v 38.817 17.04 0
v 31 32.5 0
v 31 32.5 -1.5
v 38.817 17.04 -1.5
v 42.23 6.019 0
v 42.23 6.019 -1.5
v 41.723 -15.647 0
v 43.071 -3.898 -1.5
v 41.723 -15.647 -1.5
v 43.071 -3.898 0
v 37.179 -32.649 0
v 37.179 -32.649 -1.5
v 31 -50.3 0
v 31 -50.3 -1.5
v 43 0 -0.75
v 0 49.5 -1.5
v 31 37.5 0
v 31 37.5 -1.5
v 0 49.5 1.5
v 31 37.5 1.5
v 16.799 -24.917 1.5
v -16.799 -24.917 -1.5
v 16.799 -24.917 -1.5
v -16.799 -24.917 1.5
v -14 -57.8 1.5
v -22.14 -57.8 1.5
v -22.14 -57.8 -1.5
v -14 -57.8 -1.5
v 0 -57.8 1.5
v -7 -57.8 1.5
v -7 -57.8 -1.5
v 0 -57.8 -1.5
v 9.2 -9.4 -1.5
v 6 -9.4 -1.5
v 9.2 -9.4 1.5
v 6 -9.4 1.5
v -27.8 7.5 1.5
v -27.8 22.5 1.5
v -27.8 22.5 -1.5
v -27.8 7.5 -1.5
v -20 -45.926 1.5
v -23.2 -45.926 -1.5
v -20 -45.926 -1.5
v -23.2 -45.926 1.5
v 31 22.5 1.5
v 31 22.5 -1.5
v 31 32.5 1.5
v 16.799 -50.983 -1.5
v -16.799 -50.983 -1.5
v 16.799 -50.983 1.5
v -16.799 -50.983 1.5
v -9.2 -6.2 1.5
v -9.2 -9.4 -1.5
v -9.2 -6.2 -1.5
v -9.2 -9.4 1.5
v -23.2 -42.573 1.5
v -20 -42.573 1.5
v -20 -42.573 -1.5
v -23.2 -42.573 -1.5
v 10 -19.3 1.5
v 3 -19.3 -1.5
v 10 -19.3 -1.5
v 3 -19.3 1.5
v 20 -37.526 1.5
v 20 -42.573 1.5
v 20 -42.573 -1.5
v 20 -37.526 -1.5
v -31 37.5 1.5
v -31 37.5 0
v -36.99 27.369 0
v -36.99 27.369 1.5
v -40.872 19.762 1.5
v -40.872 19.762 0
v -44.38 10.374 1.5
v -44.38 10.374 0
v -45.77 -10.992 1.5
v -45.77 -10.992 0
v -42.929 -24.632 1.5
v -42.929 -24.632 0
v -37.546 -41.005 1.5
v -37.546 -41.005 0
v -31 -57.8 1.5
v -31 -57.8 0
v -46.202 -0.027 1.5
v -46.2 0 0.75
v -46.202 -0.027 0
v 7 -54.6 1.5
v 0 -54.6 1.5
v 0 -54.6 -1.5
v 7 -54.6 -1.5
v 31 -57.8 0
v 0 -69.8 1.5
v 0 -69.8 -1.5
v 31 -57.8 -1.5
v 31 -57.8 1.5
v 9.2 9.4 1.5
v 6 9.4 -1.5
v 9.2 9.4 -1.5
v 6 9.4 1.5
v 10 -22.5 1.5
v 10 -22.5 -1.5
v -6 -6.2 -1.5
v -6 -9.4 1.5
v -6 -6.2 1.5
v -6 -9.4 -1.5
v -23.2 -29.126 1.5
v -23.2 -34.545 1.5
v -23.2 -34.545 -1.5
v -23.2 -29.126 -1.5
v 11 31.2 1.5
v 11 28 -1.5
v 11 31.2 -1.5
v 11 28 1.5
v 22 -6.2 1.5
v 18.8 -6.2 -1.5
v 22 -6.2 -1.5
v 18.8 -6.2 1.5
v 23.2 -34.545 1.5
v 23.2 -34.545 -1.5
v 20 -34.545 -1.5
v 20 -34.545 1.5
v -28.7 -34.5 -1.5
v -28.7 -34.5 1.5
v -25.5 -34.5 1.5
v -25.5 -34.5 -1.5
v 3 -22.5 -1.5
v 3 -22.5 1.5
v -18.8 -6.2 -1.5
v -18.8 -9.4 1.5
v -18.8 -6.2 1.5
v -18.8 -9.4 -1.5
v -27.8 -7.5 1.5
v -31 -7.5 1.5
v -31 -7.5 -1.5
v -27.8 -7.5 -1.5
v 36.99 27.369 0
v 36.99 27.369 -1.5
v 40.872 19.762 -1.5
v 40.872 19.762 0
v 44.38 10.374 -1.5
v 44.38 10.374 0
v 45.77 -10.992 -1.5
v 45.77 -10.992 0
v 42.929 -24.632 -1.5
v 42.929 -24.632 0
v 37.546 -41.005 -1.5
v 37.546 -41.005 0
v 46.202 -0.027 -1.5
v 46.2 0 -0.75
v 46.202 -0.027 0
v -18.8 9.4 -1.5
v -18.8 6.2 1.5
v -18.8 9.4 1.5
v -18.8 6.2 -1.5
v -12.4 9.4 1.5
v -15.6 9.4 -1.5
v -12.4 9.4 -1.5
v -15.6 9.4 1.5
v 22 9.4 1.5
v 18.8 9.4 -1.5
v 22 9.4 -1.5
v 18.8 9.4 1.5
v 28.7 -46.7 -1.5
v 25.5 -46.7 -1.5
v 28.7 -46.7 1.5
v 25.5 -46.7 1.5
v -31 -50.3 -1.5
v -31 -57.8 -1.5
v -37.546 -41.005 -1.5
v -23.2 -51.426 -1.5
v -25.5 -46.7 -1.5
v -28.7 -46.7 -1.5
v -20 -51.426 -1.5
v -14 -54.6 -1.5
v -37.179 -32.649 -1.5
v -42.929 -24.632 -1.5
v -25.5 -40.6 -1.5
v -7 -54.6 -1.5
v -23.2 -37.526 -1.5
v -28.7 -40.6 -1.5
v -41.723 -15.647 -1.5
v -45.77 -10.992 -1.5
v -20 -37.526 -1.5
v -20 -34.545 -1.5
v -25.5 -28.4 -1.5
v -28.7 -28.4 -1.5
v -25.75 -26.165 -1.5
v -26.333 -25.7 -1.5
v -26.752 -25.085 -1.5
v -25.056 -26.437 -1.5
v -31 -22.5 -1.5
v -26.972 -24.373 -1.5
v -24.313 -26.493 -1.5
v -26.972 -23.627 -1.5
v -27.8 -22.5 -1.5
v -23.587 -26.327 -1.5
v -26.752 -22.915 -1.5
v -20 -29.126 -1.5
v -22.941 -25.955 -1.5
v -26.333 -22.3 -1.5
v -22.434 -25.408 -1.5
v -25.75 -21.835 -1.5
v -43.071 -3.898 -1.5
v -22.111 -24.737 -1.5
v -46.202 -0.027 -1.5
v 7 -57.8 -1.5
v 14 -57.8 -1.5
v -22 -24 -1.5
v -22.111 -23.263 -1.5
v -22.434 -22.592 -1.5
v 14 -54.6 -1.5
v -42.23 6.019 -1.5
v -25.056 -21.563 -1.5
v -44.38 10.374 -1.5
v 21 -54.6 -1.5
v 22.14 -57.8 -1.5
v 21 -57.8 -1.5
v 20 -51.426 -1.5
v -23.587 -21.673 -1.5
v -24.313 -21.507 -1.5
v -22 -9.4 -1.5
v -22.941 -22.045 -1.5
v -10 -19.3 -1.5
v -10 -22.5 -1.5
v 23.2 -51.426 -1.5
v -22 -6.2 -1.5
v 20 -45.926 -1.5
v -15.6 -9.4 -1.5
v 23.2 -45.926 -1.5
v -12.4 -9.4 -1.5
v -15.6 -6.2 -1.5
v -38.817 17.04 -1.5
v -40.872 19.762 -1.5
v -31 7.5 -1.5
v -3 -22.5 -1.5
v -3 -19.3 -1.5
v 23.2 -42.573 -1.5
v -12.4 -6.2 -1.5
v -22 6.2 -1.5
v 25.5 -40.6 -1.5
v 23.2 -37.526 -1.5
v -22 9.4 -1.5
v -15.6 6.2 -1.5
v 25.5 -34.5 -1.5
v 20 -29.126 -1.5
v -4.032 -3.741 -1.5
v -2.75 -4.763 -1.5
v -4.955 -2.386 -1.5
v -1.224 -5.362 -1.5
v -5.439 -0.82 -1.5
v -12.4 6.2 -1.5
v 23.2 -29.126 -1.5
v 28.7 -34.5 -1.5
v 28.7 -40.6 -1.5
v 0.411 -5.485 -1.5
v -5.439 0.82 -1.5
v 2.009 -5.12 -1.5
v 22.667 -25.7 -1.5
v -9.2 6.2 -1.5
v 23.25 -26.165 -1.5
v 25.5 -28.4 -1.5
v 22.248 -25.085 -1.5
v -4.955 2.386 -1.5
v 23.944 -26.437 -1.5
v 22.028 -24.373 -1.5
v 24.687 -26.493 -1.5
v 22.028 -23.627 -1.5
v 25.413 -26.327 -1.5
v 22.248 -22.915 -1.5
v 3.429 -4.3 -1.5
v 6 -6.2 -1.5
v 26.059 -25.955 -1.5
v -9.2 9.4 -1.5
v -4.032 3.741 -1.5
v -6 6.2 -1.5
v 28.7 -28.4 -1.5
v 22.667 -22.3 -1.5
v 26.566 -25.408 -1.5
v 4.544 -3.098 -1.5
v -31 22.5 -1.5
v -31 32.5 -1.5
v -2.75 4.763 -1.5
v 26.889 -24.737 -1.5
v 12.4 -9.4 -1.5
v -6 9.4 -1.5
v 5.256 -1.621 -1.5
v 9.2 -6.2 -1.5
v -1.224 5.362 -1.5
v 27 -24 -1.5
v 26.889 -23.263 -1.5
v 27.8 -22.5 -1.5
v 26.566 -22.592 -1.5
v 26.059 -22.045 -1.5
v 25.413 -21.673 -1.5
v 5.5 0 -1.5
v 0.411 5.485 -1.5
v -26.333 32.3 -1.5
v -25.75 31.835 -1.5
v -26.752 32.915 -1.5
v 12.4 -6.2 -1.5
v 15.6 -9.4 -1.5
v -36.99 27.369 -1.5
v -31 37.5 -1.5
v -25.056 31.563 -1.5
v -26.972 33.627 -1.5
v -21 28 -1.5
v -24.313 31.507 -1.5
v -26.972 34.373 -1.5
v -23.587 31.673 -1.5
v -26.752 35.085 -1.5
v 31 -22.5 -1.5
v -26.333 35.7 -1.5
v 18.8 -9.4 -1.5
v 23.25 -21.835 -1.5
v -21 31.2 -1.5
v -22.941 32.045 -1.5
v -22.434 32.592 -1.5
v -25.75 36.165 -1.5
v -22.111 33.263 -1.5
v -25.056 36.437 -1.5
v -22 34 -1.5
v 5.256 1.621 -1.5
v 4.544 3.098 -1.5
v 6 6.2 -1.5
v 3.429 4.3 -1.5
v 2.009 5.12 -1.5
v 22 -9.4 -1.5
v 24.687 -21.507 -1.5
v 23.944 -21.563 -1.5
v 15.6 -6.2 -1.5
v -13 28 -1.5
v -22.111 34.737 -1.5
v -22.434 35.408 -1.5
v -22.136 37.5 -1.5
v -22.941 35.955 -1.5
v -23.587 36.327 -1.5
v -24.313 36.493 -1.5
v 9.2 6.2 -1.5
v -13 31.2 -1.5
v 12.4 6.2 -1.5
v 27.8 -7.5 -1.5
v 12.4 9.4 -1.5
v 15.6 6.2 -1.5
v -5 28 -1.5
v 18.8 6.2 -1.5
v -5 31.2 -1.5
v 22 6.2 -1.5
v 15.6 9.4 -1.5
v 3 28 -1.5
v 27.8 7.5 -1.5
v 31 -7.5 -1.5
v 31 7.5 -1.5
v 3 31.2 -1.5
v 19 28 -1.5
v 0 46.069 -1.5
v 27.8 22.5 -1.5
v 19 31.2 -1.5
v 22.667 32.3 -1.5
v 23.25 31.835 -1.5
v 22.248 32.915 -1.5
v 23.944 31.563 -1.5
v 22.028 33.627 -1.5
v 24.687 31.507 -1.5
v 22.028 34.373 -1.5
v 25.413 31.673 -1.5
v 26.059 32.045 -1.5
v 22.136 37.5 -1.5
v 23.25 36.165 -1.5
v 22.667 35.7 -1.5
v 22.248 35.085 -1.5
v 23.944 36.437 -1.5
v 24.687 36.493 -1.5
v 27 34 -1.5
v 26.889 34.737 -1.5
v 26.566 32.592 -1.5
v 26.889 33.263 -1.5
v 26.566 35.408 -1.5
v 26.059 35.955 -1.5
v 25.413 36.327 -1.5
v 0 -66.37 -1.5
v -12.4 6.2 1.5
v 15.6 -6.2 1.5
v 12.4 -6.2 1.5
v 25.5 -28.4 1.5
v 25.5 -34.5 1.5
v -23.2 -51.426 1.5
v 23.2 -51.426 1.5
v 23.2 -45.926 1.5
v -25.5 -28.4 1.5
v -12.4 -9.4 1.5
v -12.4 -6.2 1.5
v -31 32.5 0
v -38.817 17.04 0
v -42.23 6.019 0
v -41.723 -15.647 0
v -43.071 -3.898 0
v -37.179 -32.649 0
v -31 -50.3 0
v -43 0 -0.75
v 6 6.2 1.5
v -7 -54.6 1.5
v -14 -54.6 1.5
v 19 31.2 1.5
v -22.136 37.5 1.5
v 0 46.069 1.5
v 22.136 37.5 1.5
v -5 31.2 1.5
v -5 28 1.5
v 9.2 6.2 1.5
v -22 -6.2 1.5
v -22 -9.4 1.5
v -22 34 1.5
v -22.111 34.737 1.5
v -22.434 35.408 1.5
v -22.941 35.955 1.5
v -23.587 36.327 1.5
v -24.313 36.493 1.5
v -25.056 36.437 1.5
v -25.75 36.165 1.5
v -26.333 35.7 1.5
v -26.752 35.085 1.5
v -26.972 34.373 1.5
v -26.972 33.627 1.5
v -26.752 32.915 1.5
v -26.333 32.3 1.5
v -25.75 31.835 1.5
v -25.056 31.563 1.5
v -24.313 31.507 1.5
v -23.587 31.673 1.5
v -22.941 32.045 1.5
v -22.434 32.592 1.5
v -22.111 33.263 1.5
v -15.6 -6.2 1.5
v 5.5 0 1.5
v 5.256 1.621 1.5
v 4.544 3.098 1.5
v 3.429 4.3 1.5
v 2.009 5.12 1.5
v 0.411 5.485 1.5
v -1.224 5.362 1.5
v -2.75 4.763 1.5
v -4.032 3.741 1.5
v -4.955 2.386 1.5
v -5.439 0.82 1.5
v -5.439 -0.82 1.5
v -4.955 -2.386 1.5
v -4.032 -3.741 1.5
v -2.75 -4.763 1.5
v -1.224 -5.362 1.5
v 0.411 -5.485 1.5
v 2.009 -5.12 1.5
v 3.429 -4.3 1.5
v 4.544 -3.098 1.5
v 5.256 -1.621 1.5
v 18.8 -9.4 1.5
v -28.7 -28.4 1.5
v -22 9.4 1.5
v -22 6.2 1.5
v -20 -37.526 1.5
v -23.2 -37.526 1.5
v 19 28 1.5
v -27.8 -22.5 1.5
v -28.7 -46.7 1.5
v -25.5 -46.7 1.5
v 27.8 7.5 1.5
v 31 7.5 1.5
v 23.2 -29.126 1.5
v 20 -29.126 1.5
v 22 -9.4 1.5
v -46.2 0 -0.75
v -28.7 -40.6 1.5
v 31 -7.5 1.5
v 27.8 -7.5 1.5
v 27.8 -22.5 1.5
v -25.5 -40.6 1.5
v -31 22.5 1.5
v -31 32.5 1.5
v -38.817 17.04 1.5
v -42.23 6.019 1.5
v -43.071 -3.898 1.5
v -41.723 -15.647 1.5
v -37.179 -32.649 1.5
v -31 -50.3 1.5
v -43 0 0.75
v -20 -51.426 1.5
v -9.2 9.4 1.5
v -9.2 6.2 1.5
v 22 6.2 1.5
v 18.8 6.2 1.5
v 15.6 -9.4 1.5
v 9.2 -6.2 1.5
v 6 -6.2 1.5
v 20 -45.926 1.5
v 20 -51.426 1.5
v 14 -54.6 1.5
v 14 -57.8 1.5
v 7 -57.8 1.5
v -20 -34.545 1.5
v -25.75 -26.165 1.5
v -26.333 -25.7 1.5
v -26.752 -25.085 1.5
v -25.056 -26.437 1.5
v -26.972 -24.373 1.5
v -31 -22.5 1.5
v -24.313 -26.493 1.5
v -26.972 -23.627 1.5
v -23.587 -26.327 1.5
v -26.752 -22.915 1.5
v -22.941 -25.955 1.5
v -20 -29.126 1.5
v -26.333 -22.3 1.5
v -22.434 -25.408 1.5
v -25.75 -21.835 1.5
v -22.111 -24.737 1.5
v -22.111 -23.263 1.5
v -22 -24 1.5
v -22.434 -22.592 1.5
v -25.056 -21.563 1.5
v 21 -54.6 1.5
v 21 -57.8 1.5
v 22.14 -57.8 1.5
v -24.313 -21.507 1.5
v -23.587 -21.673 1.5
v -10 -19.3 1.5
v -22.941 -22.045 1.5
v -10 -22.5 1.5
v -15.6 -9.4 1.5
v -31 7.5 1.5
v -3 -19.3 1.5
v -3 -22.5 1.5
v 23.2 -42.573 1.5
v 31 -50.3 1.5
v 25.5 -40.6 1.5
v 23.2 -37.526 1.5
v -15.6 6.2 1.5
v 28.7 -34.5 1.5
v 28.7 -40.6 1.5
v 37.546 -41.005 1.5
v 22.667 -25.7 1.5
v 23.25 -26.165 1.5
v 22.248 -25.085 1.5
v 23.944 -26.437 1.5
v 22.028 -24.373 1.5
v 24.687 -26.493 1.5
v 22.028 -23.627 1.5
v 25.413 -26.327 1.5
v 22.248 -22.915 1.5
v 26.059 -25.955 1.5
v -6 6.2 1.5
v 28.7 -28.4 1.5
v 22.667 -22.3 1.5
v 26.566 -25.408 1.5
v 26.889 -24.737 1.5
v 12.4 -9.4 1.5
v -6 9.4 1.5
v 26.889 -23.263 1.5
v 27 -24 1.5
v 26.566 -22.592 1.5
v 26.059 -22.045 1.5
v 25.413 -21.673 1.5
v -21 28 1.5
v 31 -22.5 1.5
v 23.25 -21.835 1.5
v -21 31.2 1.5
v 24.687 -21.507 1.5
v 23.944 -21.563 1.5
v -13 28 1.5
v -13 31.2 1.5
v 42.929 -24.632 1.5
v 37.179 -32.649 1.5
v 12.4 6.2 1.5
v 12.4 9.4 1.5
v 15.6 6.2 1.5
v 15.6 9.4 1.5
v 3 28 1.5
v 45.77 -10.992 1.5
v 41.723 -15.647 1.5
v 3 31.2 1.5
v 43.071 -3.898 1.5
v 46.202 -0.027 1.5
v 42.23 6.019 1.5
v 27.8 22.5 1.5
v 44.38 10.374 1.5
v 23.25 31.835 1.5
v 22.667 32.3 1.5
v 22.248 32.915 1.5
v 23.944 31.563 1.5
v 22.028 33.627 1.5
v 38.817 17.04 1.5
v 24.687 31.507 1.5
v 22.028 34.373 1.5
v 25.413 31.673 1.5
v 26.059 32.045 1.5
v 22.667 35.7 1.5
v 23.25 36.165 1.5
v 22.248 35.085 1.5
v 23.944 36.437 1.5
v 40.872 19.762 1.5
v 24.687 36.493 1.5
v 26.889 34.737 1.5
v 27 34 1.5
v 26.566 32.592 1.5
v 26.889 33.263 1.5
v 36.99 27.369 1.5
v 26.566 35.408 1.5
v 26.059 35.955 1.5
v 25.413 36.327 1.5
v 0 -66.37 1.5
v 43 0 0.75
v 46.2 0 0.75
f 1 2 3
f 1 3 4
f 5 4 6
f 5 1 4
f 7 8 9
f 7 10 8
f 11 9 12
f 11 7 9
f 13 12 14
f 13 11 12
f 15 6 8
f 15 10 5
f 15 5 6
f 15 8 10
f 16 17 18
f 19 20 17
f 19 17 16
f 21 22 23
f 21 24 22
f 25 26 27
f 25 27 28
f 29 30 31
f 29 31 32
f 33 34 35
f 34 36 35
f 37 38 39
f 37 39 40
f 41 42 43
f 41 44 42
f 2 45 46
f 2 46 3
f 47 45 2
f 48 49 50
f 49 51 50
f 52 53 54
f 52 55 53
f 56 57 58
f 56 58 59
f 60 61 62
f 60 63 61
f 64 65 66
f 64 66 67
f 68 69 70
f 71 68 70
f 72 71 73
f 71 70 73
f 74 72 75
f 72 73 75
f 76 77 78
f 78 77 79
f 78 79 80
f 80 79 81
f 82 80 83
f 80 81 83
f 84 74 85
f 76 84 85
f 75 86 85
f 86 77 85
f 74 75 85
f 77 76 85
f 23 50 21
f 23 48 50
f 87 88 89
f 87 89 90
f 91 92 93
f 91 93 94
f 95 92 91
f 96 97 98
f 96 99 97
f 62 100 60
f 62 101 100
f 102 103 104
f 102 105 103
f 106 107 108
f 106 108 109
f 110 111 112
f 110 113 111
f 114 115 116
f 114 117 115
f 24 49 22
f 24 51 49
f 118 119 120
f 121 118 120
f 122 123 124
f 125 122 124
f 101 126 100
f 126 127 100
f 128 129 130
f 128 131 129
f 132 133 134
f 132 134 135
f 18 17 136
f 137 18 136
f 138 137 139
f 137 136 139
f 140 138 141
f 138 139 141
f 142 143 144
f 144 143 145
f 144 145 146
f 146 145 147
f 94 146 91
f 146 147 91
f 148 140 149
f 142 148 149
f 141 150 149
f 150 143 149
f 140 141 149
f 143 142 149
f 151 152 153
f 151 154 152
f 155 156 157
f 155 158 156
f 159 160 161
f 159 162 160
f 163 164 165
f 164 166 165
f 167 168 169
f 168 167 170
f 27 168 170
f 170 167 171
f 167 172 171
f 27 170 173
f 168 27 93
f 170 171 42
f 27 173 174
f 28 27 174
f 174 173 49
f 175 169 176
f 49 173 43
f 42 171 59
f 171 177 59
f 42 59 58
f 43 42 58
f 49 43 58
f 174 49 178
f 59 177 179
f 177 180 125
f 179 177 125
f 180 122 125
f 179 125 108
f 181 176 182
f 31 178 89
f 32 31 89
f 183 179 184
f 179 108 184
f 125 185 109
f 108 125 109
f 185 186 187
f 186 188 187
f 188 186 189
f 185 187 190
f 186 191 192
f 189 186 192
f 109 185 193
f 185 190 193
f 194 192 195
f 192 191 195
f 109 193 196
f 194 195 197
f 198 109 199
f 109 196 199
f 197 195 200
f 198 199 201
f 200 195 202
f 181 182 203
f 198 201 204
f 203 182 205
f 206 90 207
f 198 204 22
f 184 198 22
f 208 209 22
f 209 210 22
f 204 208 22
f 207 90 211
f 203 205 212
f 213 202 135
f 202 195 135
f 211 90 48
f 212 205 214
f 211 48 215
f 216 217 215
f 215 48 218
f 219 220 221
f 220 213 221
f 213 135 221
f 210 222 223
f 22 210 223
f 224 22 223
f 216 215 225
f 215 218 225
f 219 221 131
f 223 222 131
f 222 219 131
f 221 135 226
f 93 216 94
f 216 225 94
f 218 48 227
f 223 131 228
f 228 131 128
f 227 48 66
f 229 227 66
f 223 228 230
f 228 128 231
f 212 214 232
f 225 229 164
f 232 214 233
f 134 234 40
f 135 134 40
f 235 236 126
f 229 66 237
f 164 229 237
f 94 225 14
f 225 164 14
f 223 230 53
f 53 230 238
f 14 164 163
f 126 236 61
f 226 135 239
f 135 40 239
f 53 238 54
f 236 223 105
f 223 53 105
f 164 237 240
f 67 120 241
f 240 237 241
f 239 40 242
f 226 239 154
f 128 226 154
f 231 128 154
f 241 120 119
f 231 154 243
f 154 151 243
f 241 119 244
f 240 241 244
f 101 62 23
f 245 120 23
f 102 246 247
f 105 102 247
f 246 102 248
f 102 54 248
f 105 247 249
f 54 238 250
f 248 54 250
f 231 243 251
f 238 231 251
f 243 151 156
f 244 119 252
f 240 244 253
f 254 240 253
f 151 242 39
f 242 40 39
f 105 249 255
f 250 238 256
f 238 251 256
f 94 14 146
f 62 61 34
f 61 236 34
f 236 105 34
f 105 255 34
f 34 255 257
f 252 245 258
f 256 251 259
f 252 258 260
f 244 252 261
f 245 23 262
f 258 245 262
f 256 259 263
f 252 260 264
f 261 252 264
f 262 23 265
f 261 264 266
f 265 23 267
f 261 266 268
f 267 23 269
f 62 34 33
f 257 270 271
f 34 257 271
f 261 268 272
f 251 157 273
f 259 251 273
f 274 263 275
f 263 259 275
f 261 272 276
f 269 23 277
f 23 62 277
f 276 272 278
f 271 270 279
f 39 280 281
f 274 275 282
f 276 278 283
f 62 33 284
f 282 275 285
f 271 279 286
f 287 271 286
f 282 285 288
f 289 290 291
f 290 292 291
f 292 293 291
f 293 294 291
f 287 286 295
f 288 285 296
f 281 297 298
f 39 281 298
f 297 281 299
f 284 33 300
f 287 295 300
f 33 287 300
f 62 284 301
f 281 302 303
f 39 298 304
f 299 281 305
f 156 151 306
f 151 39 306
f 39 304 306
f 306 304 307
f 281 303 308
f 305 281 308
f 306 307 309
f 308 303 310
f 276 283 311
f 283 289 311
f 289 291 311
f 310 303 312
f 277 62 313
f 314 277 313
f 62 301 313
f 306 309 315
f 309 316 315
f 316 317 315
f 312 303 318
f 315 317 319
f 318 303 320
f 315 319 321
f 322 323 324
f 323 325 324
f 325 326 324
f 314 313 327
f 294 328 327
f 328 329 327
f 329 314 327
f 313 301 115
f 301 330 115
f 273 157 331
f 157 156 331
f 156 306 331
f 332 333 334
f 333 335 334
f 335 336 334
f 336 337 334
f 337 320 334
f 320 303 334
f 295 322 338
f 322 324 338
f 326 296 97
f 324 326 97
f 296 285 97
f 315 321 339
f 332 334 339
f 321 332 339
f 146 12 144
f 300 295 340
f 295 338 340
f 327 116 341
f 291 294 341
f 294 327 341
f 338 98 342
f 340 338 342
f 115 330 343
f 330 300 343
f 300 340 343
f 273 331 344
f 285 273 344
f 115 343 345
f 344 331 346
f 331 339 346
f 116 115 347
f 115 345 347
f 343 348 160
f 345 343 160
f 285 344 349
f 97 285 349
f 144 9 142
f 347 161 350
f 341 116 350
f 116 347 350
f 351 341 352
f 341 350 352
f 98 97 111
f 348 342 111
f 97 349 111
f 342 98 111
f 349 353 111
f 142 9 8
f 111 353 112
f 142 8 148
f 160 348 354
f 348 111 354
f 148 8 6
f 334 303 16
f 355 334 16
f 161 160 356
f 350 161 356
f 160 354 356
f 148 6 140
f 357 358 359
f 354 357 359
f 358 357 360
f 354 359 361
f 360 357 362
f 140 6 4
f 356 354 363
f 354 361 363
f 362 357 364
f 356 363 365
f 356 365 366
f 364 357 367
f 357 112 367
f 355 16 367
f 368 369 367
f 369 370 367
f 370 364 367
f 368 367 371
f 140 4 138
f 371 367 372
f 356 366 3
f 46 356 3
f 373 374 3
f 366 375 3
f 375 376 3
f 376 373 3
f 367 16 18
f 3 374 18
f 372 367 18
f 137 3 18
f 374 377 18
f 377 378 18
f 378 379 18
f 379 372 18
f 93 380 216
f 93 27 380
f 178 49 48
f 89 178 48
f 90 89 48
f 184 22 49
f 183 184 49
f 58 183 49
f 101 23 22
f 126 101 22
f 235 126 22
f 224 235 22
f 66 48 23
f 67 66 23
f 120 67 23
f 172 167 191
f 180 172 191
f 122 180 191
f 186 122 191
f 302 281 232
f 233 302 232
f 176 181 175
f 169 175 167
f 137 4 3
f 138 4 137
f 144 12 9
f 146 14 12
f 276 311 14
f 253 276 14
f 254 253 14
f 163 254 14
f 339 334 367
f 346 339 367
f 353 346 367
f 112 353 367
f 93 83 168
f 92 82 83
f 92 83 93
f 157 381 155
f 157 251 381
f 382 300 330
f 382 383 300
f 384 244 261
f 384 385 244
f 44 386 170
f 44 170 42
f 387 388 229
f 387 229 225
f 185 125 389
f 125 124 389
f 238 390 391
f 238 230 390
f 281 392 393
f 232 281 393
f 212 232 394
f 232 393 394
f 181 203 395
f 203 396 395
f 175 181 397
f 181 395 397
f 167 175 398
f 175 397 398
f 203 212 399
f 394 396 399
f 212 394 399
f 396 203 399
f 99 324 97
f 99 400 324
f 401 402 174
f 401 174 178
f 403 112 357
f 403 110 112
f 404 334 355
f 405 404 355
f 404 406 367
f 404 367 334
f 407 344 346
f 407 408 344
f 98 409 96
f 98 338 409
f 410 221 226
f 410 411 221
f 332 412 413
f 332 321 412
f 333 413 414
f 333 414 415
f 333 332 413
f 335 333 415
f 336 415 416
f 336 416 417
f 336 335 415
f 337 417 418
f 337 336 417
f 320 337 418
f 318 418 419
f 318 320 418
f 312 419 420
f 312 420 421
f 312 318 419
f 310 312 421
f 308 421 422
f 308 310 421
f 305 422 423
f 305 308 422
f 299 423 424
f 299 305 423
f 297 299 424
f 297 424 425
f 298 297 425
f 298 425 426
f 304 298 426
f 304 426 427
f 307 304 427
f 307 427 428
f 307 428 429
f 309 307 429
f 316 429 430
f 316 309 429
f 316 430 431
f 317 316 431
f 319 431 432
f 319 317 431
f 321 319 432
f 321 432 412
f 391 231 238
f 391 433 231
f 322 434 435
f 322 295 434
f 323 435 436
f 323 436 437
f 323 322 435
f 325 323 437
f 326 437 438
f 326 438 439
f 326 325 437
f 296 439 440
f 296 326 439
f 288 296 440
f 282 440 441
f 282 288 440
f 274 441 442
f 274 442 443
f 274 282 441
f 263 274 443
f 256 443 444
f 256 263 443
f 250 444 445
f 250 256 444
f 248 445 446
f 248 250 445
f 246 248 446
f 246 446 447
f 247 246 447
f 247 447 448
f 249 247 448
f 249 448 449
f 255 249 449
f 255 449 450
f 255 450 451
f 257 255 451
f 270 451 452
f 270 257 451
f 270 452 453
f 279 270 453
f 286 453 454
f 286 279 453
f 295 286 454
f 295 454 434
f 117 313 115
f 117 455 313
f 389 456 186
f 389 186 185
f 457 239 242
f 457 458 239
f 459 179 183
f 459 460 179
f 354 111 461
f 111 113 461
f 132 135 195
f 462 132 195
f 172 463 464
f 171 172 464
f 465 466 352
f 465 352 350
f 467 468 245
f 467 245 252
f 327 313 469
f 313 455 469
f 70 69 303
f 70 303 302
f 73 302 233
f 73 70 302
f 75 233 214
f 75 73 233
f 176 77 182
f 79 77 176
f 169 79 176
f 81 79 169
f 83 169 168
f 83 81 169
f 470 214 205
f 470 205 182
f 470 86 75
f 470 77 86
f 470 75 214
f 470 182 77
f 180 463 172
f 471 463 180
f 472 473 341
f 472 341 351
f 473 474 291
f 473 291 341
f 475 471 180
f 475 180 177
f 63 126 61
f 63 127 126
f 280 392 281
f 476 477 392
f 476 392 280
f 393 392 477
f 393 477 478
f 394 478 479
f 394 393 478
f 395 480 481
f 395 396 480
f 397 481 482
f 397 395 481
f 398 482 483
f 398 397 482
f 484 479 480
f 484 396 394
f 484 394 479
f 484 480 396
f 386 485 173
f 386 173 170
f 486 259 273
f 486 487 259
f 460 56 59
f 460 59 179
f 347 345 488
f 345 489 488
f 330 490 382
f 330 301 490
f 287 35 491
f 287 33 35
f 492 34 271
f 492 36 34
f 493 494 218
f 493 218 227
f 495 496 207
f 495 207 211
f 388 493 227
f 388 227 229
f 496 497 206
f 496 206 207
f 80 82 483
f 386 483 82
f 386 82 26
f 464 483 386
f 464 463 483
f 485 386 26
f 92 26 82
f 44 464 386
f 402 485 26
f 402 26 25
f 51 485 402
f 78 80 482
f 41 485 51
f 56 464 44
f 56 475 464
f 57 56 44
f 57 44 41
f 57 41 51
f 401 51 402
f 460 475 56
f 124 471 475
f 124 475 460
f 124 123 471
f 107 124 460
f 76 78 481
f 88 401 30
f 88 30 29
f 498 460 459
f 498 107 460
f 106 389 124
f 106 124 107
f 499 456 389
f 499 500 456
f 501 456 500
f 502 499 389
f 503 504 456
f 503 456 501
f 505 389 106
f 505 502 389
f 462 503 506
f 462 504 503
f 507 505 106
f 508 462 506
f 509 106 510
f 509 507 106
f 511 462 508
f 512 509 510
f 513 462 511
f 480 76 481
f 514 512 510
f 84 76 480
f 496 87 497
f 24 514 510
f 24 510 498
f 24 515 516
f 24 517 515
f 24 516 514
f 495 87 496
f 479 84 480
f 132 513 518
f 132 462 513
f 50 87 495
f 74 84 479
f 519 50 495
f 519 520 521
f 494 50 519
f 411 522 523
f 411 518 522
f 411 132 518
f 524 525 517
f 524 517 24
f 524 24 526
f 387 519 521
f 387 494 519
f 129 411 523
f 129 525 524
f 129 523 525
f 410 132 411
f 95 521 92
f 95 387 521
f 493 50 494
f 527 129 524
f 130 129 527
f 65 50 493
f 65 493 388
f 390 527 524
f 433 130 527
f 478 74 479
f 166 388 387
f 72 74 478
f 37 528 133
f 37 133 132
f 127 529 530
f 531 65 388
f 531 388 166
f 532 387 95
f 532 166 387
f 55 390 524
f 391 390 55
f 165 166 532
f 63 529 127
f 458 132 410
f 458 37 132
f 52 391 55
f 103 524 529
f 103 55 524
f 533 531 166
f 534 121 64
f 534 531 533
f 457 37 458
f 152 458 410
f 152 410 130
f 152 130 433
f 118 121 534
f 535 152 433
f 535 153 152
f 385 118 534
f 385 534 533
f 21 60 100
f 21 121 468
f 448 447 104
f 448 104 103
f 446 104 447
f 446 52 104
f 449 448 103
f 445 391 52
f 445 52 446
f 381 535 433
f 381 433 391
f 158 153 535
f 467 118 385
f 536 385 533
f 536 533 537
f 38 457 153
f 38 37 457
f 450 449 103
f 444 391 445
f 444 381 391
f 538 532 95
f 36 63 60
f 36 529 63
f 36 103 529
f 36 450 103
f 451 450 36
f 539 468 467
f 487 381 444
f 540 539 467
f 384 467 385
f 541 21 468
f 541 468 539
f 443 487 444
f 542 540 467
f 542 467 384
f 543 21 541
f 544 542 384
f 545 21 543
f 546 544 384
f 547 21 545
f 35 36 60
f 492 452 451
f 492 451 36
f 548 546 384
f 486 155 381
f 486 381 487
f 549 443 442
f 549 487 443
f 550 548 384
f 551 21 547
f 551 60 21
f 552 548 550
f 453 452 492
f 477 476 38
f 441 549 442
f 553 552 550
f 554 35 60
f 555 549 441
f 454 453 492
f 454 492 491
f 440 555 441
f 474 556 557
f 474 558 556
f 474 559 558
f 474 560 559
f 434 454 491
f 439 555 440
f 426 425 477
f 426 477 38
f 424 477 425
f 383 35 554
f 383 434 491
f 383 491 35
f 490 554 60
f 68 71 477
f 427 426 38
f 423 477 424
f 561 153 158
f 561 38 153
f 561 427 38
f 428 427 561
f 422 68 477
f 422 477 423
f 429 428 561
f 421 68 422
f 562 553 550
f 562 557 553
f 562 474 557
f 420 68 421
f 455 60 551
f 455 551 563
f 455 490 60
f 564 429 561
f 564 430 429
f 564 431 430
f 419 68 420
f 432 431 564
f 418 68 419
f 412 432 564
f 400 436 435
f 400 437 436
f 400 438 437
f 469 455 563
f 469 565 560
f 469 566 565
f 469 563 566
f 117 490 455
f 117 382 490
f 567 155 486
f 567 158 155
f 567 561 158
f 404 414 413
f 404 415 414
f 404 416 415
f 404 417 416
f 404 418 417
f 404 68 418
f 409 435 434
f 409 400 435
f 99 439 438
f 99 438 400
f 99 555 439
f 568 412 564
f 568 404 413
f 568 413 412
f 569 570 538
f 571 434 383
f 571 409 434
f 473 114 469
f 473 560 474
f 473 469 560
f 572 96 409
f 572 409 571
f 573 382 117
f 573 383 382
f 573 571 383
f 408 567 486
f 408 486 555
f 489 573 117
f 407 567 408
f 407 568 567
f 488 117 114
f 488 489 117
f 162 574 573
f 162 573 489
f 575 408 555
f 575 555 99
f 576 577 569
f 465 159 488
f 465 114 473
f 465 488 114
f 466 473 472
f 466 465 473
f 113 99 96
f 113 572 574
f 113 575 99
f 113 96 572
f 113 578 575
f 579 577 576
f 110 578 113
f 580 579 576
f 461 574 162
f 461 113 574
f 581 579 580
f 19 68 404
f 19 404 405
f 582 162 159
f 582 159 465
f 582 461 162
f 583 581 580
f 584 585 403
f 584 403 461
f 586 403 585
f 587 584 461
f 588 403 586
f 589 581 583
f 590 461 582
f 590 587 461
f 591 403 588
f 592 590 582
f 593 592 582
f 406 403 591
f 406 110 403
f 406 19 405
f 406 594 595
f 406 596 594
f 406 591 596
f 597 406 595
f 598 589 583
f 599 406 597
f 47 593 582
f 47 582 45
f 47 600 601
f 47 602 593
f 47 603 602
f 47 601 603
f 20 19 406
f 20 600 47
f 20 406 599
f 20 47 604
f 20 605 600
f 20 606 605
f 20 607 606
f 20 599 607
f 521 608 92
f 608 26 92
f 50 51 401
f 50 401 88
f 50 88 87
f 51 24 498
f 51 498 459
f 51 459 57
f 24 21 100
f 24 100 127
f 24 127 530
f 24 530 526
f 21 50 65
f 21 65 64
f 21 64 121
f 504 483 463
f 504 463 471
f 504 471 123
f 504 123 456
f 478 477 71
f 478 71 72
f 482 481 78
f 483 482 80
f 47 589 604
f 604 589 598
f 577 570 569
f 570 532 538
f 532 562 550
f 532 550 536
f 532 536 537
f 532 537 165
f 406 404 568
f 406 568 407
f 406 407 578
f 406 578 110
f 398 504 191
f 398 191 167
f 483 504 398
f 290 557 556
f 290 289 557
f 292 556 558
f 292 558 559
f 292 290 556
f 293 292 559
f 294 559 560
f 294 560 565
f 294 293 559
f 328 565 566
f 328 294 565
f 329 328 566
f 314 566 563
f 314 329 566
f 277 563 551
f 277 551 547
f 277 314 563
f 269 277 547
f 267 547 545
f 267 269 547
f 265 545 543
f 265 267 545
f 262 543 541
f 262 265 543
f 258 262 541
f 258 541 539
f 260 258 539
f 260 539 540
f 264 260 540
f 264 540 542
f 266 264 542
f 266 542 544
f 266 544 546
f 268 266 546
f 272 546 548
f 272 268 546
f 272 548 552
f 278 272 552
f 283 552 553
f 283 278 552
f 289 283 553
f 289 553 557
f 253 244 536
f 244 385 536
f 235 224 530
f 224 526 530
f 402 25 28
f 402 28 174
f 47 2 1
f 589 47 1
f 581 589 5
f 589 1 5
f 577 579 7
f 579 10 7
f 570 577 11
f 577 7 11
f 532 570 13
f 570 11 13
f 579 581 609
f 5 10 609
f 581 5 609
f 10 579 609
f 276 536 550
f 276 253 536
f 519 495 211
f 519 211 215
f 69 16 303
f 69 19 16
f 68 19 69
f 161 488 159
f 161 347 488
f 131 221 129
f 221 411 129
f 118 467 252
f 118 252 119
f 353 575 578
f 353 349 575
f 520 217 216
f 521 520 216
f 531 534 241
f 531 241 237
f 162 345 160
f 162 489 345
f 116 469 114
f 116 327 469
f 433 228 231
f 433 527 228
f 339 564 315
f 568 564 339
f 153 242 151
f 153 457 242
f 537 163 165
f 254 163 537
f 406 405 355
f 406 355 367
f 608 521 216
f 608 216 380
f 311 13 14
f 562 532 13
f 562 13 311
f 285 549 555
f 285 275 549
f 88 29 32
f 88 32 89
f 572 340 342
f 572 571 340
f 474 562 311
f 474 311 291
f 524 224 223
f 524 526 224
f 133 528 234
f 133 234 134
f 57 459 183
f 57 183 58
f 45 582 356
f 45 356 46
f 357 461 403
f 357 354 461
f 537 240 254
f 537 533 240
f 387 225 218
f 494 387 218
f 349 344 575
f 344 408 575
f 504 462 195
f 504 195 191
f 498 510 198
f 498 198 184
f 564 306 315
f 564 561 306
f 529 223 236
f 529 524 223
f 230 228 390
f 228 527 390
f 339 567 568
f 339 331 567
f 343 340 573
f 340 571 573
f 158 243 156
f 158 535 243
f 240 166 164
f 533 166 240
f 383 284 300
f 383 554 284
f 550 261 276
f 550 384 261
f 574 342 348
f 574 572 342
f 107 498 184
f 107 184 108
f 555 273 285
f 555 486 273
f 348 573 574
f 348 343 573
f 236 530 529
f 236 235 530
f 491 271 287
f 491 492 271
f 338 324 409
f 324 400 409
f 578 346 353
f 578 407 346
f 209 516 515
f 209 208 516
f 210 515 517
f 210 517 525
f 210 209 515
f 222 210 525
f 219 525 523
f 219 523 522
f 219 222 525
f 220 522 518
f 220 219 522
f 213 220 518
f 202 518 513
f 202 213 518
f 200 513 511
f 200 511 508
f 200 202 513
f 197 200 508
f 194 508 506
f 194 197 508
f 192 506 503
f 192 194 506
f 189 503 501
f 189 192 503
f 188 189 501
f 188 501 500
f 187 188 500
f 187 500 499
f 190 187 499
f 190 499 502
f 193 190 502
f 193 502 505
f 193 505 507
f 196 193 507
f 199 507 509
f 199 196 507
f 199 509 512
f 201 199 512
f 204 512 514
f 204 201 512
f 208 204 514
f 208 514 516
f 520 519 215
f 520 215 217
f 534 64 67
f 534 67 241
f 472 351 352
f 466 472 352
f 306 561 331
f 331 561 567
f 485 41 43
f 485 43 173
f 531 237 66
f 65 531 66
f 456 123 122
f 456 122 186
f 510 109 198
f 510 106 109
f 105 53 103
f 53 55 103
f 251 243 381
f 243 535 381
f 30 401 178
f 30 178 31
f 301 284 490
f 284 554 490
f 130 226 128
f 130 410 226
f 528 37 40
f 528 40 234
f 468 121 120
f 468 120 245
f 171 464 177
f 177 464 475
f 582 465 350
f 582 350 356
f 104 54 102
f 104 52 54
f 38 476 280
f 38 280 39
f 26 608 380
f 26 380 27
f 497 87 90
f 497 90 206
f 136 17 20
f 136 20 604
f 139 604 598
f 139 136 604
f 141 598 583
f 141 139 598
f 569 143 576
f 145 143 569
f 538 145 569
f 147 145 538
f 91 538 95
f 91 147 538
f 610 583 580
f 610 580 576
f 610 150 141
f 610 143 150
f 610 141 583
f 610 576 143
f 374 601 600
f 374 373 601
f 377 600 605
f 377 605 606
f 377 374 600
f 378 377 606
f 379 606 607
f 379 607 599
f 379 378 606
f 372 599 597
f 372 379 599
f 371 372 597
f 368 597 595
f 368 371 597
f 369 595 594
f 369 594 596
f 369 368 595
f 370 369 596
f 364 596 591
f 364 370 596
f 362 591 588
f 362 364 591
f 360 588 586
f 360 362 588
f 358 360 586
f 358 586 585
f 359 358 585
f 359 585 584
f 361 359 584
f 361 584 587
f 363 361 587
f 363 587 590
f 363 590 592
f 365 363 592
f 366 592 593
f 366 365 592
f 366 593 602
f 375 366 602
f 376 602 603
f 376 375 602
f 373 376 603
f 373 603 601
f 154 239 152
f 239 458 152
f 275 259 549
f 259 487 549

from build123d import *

# Parameters (mm, degrees)
F0_W     = 3.2
F0_H     = 6.1
F0_R     = 2.5
F0_W_2   = 7
F0_H_2   = 3.2
F0_W_3   = 33.5989631712
F0_H_3   = 26.0656554639
F0_W_4   = 8
F0_R_2   = 5.5
F1_DEPTH = 1.5


with BuildPart() as f1:
    # F0 (on Top) → F1 (new body, symmetric)
    with BuildSketch(Plane.XY):
        with BuildLine():
            Line((0, 49.5), (-31, 37.5))
            add(Edge.make_bspline(
                [(-31, 37.5), (-38.1511552694, 25.7567925156), (-53.9932959403, -0.2582411241), (-39.1454927008, -37.415537584), (-31, -57.8)],
                knots=[0, 0, 0, 0, 0.4514008187, 1, 1, 1, 1], degree=3))
            Line((-31, -57.8), (0, -69.8))
            Line((0, -69.8), (31, -57.8))
            add(Edge.make_bspline(
                [(31, 37.5), (38.1511552694, 25.7567925156), (53.9932959403, -0.2582411241), (39.1454927008, -37.415537584), (31, -57.8)],
                knots=[0, 0, 0, 0, 0.4514008187, 1, 1, 1, 1], degree=3))
            Line((31, 37.5), (0, 49.5))
        make_face()
        with Locations((-27.1, -43.65)):
            Rectangle(F0_W, F0_H, mode=Mode.SUBTRACT)
        Polygon((-20, -45.92561), (-20, -50.12561), (-20, -51.42561), (-23.2, -51.42561), (-23.2, -50.12561), (-23.2, -45.92561), align=None, mode=Mode.SUBTRACT)
        Polygon((-20, -37.52561), (-20, -41.72561), (-20, -42.5726920366), (-23.2, -42.5726920366), (-23.2, -41.72561), (-23.2, -37.52561), align=None, mode=Mode.SUBTRACT)
        with Locations((-27.1, -31.45)):
            Rectangle(F0_W, F0_H, mode=Mode.SUBTRACT)
        Polygon((-20, -29.12561), (-20, -33.32561), (-20, -34.545276314), (-23.2, -34.545276314), (-23.2, -33.32561), (-23.2, -29.12561), align=None, mode=Mode.SUBTRACT)
        with Locations((-24.5, -24)):
            Circle(F0_R, mode=Mode.SUBTRACT)
        with Locations((-6.5, -20.9)):
            Rectangle(F0_W_2, F0_H_2, mode=Mode.SUBTRACT)
        Polygon((0, -66.37), (-22.14, -57.8), (-14, -57.8), (-14, -54.6), (-7, -54.6), (-7, -57.8), (0, -57.8), (0, -54.6), (7, -54.6), (7, -57.8), (14, -57.8), (14, -54.6), (21, -54.6), (21, -57.8), (22.14, -57.8), align=None, mode=Mode.SUBTRACT)
        Polygon((20, -50.12561), (20, -45.92561), (23.2, -45.92561), (23.2, -50.12561), (23.2, -51.42561), (20, -51.42561), align=None, mode=Mode.SUBTRACT)
        Polygon((20, -37.52561), (23.2, -37.52561), (23.2, -41.72561), (23.2, -42.5726920366), (20, -42.5726920366), (20, -41.72561), align=None, mode=Mode.SUBTRACT)
        with Locations((27.1, -43.65)):
            Rectangle(F0_W, F0_H, mode=Mode.SUBTRACT)
        with Locations((0, -37.95)):
            Rectangle(F0_W_3, F0_H_3, mode=Mode.SUBTRACT)
        Polygon((20, -29.12561), (23.2, -29.12561), (23.2, -33.32561), (23.2, -34.545276314), (20, -34.545276314), (20, -33.32561), align=None, mode=Mode.SUBTRACT)
        with Locations((6.5, -20.9)):
            Rectangle(F0_W_2, F0_H_2, mode=Mode.SUBTRACT)
        with Locations((24.5, -24)):
            Circle(F0_R, mode=Mode.SUBTRACT)
        with Locations((27.1, -31.45)):
            Rectangle(F0_W, F0_H, mode=Mode.SUBTRACT)
        with BuildLine():
            Line((-31, -22.5), (-31, -32.5))
            Line((-31, -32.5), (-31, -50.3))
            add(Edge.make_bspline(
                [(-31, 32.5), (-36.6370197512, 22.3171385617), (-49.1609689327, -0.3064541885), (-37.4434647152, -32.5624194988), (-31, -50.3)],
                knots=[0, 0, 0, 0, 0.4500992195, 1, 1, 1, 1], degree=3))
            Line((-31, 32.5), (-31, 22.5))
            Line((-31, 22.5), (-27.8, 22.5))
            Line((-27.8, 22.5), (-27.8, 7.5))
            Line((-27.8, 7.5), (-31, 7.5))
            Line((-31, 7.5), (-31, -7.5))
            Line((-31, -7.5), (-27.8, -7.5))
            Line((-27.8, -7.5), (-27.8, -22.5))
            Line((-27.8, -22.5), (-31, -22.5))
        make_face(mode=Mode.SUBTRACT)
        with Locations((-20.4, -7.8)):
            Rectangle(F0_W, F0_H_2, mode=Mode.SUBTRACT)
        with Locations((-14, -7.8)):
            Rectangle(F0_W, F0_H_2, mode=Mode.SUBTRACT)
        with Locations((-7.6, -7.8)):
            Rectangle(F0_W, F0_H_2, mode=Mode.SUBTRACT)
        with Locations((-20.4, 7.8)):
            Rectangle(F0_W, F0_H_2, mode=Mode.SUBTRACT)
        with Locations((-14, 7.8)):
            Rectangle(F0_W, F0_H_2, mode=Mode.SUBTRACT)
        with Locations((-7.6, 7.8)):
            Rectangle(F0_W, F0_H_2, mode=Mode.SUBTRACT)
        with Locations((-24.5, 34)):
            Circle(F0_R, mode=Mode.SUBTRACT)
        with Locations((-17, 29.6)):
            Rectangle(F0_W_4, F0_H_2, mode=Mode.SUBTRACT)
        with Locations((-1, 29.6)):
            Rectangle(F0_W_4, F0_H_2, mode=Mode.SUBTRACT)
        with Locations((7.6, -7.8)):
            Rectangle(F0_W, F0_H_2, mode=Mode.SUBTRACT)
        Circle(F0_R_2, mode=Mode.SUBTRACT)
        with Locations((14, -7.8)):
            Rectangle(F0_W, F0_H_2, mode=Mode.SUBTRACT)
        with Locations((20.4, -7.8)):
            Rectangle(F0_W, F0_H_2, mode=Mode.SUBTRACT)
        with Locations((7.6, 7.8)):
            Rectangle(F0_W, F0_H_2, mode=Mode.SUBTRACT)
        with Locations((14, 7.8)):
            Rectangle(F0_W, F0_H_2, mode=Mode.SUBTRACT)
        with Locations((20.4, 7.8)):
            Rectangle(F0_W, F0_H_2, mode=Mode.SUBTRACT)
        with BuildLine():
            Line((27.8, 7.5), (27.8, 22.5))
            Line((27.8, 22.5), (31, 22.5))
            Line((31, 22.5), (31, 32.5))
            add(Edge.make_bspline(
                [(31, 32.5), (36.6370197512, 22.3171385617), (49.1609689327, -0.3064541885), (37.4434647152, -32.5624194988), (31, -50.3)],
                knots=[0, 0, 0, 0, 0.4500992195, 1, 1, 1, 1], degree=3))
            Line((31, -50.3), (31, -32.5))
            Line((31, -32.5), (31, -22.5))
            Line((31, -22.5), (27.8, -22.5))
            Line((27.8, -22.5), (27.8, -7.5))
            Line((27.8, -7.5), (31, -7.5))
            Line((31, -7.5), (31, 7.5))
            Line((31, 7.5), (27.8, 7.5))
        make_face(mode=Mode.SUBTRACT)
        with Locations((15, 29.6)):
            Rectangle(F0_W_4, F0_H_2, mode=Mode.SUBTRACT)
        with Locations((24.5, 34)):
            Circle(F0_R, mode=Mode.SUBTRACT)
        Polygon((22.1355892594, 37.5), (0, 37.5), (-22.1355892594, 37.5), (0, 46.0686151972), align=None, mode=Mode.SUBTRACT)
    extrude(amount=F1_DEPTH, both=True)


solid = f1.part
